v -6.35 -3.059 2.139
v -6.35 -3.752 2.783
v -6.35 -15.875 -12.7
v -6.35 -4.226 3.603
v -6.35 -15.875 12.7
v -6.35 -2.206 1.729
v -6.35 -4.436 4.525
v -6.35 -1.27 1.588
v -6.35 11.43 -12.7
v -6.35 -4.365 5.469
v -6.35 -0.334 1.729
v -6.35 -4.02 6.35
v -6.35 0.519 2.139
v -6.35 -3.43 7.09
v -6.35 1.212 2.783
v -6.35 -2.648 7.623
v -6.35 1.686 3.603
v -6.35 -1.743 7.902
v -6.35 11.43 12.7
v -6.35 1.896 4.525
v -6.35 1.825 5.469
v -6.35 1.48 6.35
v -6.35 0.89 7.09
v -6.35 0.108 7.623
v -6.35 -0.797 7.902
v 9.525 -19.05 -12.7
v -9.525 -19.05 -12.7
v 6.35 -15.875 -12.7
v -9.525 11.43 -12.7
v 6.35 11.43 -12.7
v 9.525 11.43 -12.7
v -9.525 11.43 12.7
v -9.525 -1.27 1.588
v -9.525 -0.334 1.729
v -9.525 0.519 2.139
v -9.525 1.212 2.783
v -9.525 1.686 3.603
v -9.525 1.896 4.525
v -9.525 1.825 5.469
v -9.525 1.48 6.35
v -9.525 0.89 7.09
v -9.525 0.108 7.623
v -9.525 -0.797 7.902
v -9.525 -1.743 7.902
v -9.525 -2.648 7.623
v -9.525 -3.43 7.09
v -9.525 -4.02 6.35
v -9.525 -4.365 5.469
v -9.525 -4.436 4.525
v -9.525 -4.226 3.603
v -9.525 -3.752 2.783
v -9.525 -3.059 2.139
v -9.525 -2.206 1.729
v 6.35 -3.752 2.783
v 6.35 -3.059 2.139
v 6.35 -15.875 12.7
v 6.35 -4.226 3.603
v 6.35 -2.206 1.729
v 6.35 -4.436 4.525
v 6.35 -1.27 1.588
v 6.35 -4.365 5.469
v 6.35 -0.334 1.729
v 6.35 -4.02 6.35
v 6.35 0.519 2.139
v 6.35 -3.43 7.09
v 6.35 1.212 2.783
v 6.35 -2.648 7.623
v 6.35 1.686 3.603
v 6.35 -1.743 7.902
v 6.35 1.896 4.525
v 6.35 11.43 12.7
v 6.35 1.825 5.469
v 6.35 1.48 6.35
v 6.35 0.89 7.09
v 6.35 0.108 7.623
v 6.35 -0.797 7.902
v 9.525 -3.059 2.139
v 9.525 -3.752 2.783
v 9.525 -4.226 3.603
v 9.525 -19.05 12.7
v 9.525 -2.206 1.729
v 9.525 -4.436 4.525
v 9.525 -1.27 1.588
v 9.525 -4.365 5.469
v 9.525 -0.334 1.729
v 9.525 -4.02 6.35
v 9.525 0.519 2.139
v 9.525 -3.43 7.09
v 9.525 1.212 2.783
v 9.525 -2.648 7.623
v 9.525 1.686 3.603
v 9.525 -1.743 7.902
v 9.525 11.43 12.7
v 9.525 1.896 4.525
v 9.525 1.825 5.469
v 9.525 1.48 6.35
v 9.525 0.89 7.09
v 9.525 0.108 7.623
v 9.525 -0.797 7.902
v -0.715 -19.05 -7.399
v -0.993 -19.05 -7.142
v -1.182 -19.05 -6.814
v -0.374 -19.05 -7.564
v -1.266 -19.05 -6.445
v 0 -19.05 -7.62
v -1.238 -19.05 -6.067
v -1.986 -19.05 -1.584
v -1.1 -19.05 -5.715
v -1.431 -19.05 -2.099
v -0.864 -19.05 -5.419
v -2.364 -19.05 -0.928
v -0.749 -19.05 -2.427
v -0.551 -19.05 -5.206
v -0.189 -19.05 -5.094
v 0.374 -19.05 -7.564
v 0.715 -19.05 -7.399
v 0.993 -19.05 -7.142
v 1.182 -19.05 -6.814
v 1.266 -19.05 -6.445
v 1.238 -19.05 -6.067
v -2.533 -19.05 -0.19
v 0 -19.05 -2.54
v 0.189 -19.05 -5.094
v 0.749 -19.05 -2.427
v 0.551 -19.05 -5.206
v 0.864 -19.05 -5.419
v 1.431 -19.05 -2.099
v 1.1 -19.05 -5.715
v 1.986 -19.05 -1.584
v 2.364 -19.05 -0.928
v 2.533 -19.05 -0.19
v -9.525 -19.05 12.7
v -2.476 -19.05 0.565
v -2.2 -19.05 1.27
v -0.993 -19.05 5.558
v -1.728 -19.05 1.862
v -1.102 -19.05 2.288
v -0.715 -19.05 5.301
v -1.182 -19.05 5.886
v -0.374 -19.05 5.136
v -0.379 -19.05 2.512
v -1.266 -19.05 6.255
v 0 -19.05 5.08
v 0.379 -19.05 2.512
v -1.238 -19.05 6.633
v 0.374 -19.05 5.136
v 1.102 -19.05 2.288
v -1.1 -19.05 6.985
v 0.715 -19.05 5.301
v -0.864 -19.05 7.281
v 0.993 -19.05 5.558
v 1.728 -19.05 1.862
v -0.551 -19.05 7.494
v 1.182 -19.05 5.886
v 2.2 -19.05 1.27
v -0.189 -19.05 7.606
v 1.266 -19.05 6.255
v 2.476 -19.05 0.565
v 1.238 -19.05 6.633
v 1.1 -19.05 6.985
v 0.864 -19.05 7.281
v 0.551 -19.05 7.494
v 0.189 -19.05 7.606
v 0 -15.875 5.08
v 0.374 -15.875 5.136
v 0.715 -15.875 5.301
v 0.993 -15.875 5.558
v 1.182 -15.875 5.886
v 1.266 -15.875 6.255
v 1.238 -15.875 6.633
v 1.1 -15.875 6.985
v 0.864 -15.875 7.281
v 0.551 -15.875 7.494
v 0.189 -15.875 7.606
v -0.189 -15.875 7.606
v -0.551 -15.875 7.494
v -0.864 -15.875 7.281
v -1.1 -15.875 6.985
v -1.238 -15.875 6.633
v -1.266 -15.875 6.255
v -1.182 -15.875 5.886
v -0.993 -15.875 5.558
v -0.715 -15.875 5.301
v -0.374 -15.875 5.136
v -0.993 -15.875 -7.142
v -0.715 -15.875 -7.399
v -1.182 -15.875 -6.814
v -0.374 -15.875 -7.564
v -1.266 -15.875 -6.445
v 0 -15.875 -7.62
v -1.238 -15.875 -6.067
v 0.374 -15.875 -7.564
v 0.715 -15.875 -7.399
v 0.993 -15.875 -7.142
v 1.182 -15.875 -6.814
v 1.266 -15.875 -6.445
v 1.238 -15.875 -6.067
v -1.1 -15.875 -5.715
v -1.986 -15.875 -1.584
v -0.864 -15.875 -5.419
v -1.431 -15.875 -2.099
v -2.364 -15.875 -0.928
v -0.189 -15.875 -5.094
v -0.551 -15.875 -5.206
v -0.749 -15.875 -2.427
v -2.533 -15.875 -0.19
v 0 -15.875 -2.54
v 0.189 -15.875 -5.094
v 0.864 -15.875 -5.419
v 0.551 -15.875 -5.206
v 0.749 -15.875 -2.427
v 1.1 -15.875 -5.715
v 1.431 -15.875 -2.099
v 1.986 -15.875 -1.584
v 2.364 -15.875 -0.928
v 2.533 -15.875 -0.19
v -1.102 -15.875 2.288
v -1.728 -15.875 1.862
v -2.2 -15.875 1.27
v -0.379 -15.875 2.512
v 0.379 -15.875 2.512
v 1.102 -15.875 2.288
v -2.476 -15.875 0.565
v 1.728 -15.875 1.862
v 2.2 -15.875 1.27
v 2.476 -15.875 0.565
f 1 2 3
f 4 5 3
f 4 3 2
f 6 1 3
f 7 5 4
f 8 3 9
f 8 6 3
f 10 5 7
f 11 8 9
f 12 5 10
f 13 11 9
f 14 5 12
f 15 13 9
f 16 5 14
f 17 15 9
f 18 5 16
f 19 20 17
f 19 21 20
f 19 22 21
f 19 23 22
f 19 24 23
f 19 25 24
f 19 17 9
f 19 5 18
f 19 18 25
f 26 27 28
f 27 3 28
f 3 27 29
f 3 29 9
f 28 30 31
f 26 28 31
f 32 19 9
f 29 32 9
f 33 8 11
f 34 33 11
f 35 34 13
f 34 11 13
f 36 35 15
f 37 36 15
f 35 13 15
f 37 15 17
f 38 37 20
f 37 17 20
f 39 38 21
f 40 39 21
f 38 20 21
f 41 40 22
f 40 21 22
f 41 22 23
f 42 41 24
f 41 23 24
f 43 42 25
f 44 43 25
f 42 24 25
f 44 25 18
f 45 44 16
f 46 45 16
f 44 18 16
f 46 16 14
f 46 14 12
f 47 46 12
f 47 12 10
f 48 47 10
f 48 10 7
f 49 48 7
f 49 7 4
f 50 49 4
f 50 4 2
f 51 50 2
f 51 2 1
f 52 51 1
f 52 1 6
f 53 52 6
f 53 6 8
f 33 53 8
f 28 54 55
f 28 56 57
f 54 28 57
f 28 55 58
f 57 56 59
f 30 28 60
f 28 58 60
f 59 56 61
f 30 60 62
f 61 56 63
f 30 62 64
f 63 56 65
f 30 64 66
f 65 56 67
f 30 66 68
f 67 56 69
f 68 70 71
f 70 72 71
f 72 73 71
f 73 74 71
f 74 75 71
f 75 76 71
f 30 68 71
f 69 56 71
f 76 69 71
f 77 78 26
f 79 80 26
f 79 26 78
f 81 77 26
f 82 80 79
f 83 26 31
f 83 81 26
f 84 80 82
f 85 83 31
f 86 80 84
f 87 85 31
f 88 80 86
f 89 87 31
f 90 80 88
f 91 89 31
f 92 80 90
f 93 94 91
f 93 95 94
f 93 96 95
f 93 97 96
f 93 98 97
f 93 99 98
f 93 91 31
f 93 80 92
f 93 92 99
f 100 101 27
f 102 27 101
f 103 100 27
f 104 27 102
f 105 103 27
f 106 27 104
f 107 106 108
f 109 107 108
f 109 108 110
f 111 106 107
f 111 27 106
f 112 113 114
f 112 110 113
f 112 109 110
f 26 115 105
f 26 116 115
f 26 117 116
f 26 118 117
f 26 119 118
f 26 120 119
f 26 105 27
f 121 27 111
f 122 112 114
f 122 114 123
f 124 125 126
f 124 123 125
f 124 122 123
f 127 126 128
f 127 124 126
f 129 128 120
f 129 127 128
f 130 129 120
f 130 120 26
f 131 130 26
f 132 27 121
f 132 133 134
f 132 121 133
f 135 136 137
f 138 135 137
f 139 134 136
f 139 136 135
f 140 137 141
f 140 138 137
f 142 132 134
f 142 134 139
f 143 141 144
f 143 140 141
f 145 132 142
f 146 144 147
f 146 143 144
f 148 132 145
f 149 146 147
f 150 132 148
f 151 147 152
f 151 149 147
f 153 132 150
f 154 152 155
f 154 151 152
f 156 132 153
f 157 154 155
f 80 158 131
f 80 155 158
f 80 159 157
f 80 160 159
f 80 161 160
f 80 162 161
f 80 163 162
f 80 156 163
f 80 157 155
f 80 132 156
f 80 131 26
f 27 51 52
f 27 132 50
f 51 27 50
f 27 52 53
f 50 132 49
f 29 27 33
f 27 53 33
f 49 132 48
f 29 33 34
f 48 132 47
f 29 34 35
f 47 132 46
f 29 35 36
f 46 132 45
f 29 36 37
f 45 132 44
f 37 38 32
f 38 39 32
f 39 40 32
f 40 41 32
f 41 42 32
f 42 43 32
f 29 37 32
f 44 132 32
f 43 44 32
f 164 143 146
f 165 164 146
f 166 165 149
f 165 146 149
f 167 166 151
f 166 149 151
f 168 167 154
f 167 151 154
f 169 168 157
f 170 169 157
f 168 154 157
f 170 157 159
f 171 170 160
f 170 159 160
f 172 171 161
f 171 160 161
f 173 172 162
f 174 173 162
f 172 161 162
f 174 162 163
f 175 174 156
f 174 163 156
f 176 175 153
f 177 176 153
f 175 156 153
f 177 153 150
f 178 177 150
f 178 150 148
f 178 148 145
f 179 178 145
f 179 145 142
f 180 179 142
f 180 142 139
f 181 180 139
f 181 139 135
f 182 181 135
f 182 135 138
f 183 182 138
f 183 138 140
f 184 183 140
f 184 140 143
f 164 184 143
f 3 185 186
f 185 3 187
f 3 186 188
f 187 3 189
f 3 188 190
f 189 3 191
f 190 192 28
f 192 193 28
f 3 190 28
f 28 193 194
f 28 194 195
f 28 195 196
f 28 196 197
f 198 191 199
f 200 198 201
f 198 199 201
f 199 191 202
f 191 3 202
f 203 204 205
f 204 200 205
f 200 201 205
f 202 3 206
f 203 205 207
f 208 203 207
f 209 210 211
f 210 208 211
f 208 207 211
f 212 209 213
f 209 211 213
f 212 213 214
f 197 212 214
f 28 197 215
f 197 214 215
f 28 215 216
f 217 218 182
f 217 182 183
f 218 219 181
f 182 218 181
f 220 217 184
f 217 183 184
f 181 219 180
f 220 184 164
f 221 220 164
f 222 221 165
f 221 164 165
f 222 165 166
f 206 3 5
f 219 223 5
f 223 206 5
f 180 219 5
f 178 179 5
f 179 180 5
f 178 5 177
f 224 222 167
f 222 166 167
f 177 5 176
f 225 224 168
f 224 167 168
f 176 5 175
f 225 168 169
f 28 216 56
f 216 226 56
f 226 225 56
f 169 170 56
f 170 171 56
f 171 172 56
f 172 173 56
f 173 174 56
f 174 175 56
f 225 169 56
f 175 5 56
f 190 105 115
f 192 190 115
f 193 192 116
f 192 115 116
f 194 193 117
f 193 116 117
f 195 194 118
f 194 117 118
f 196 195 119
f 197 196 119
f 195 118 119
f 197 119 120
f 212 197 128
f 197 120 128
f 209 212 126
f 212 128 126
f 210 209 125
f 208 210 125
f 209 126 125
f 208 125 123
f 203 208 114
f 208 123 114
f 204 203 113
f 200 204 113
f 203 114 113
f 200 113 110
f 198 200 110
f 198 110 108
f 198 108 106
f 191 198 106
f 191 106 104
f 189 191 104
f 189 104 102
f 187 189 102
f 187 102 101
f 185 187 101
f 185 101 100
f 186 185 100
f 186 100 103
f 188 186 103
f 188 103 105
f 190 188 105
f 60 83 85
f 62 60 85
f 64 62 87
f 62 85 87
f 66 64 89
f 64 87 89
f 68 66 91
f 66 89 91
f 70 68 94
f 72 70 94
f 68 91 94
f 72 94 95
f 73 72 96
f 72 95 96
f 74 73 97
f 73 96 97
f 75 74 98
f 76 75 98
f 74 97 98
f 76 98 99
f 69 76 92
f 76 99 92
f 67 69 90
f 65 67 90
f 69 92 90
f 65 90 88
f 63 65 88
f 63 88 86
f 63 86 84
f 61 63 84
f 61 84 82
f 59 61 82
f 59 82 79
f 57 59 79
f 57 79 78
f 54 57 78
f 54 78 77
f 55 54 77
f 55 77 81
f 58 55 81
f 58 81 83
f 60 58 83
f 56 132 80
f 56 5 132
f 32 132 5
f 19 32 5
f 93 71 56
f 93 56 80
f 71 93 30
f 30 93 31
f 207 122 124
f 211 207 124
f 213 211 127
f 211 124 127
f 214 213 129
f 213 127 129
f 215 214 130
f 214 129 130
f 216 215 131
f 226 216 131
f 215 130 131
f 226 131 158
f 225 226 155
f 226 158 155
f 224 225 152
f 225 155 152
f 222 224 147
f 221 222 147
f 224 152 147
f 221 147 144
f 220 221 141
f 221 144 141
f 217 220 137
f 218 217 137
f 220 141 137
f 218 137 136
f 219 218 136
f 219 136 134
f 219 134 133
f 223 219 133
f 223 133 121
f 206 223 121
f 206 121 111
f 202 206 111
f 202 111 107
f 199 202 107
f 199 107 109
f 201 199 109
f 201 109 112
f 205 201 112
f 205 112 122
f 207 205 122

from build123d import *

# Parameters (mm, degrees)
SKETCH1_W           = 19.05
SKETCH1_H           = 38.1
SKETCH1_W_2         = 12.7
SKETCH1_H_2         = 31.75
BOSS_EXTRUDE1_DEPTH = 12.7
SKETCH2_R           = 2.54
CUT_EXTRUDE1_DEPTH  = 76.2
SKETCH3_R           = 3.175
CUT_EXTRUDE2_DEPTH  = 30.784140075
SKETCH4_W           = 25.4
SKETCH4_H           = 7.62
CUT_EXTRUDE3_DEPTH  = 30.784140075
SKETCH5_R           = 1.27
CUT_EXTRUDE4_DEPTH  = 35.366350184


with BuildPart() as part:
    # Sketch1 → Boss-Extrude1 (new, symmetric)
    with BuildSketch(Plane.XY):
        Rectangle(SKETCH1_W, SKETCH1_H)
        Rectangle(SKETCH1_W_2, SKETCH1_H_2, mode=Mode.SUBTRACT)
    extrude(amount=BOSS_EXTRUDE1_DEPTH, both=True)

    # Sketch2 → Cut-Extrude1 (cut)
    with BuildSketch(Plane.XZ.offset(19.05)):
        with Locations(Location((0, 0, 0), (0, 0, 270))):
            Circle(SKETCH2_R)
    extrude(amount=-CUT_EXTRUDE1_DEPTH, mode=Mode.SUBTRACT)

    # Sketch3 → Cut-Extrude2 (cut, through all)
    with BuildSketch(Plane(origin=(9.525, 0, 0), x_dir=(0, 0, -1), z_dir=(1, 0, 0))):
        with Locations((-4.7625, -1.27)):
            Circle(SKETCH3_R)
    extrude(amount=-CUT_EXTRUDE2_DEPTH, mode=Mode.SUBTRACT)

    # Sketch4 → Cut-Extrude3 (cut, through all)
    with BuildSketch(Plane(origin=(9.525, 0, 0), x_dir=(0, 0, -1), z_dir=(1, 0, 0))):
        with Locations((0, 15.24)):
            Rectangle(SKETCH4_W, SKETCH4_H)
    extrude(amount=-CUT_EXTRUDE3_DEPTH, mode=Mode.SUBTRACT)

    # Sketch5 → Cut-Extrude4 (cut, through all)
    with BuildSketch(Plane.XZ.offset(19.05)):
        with Locations(Location((0, -6.35, 0), (0, 0, 270))):
            Circle(SKETCH5_R)
        with Locations(Location((0, 6.35, 0), (0, 0, 270))):
            Circle(SKETCH5_R)
    extrude(amount=-CUT_EXTRUDE4_DEPTH, mode=Mode.SUBTRACT)


solid = part.part
